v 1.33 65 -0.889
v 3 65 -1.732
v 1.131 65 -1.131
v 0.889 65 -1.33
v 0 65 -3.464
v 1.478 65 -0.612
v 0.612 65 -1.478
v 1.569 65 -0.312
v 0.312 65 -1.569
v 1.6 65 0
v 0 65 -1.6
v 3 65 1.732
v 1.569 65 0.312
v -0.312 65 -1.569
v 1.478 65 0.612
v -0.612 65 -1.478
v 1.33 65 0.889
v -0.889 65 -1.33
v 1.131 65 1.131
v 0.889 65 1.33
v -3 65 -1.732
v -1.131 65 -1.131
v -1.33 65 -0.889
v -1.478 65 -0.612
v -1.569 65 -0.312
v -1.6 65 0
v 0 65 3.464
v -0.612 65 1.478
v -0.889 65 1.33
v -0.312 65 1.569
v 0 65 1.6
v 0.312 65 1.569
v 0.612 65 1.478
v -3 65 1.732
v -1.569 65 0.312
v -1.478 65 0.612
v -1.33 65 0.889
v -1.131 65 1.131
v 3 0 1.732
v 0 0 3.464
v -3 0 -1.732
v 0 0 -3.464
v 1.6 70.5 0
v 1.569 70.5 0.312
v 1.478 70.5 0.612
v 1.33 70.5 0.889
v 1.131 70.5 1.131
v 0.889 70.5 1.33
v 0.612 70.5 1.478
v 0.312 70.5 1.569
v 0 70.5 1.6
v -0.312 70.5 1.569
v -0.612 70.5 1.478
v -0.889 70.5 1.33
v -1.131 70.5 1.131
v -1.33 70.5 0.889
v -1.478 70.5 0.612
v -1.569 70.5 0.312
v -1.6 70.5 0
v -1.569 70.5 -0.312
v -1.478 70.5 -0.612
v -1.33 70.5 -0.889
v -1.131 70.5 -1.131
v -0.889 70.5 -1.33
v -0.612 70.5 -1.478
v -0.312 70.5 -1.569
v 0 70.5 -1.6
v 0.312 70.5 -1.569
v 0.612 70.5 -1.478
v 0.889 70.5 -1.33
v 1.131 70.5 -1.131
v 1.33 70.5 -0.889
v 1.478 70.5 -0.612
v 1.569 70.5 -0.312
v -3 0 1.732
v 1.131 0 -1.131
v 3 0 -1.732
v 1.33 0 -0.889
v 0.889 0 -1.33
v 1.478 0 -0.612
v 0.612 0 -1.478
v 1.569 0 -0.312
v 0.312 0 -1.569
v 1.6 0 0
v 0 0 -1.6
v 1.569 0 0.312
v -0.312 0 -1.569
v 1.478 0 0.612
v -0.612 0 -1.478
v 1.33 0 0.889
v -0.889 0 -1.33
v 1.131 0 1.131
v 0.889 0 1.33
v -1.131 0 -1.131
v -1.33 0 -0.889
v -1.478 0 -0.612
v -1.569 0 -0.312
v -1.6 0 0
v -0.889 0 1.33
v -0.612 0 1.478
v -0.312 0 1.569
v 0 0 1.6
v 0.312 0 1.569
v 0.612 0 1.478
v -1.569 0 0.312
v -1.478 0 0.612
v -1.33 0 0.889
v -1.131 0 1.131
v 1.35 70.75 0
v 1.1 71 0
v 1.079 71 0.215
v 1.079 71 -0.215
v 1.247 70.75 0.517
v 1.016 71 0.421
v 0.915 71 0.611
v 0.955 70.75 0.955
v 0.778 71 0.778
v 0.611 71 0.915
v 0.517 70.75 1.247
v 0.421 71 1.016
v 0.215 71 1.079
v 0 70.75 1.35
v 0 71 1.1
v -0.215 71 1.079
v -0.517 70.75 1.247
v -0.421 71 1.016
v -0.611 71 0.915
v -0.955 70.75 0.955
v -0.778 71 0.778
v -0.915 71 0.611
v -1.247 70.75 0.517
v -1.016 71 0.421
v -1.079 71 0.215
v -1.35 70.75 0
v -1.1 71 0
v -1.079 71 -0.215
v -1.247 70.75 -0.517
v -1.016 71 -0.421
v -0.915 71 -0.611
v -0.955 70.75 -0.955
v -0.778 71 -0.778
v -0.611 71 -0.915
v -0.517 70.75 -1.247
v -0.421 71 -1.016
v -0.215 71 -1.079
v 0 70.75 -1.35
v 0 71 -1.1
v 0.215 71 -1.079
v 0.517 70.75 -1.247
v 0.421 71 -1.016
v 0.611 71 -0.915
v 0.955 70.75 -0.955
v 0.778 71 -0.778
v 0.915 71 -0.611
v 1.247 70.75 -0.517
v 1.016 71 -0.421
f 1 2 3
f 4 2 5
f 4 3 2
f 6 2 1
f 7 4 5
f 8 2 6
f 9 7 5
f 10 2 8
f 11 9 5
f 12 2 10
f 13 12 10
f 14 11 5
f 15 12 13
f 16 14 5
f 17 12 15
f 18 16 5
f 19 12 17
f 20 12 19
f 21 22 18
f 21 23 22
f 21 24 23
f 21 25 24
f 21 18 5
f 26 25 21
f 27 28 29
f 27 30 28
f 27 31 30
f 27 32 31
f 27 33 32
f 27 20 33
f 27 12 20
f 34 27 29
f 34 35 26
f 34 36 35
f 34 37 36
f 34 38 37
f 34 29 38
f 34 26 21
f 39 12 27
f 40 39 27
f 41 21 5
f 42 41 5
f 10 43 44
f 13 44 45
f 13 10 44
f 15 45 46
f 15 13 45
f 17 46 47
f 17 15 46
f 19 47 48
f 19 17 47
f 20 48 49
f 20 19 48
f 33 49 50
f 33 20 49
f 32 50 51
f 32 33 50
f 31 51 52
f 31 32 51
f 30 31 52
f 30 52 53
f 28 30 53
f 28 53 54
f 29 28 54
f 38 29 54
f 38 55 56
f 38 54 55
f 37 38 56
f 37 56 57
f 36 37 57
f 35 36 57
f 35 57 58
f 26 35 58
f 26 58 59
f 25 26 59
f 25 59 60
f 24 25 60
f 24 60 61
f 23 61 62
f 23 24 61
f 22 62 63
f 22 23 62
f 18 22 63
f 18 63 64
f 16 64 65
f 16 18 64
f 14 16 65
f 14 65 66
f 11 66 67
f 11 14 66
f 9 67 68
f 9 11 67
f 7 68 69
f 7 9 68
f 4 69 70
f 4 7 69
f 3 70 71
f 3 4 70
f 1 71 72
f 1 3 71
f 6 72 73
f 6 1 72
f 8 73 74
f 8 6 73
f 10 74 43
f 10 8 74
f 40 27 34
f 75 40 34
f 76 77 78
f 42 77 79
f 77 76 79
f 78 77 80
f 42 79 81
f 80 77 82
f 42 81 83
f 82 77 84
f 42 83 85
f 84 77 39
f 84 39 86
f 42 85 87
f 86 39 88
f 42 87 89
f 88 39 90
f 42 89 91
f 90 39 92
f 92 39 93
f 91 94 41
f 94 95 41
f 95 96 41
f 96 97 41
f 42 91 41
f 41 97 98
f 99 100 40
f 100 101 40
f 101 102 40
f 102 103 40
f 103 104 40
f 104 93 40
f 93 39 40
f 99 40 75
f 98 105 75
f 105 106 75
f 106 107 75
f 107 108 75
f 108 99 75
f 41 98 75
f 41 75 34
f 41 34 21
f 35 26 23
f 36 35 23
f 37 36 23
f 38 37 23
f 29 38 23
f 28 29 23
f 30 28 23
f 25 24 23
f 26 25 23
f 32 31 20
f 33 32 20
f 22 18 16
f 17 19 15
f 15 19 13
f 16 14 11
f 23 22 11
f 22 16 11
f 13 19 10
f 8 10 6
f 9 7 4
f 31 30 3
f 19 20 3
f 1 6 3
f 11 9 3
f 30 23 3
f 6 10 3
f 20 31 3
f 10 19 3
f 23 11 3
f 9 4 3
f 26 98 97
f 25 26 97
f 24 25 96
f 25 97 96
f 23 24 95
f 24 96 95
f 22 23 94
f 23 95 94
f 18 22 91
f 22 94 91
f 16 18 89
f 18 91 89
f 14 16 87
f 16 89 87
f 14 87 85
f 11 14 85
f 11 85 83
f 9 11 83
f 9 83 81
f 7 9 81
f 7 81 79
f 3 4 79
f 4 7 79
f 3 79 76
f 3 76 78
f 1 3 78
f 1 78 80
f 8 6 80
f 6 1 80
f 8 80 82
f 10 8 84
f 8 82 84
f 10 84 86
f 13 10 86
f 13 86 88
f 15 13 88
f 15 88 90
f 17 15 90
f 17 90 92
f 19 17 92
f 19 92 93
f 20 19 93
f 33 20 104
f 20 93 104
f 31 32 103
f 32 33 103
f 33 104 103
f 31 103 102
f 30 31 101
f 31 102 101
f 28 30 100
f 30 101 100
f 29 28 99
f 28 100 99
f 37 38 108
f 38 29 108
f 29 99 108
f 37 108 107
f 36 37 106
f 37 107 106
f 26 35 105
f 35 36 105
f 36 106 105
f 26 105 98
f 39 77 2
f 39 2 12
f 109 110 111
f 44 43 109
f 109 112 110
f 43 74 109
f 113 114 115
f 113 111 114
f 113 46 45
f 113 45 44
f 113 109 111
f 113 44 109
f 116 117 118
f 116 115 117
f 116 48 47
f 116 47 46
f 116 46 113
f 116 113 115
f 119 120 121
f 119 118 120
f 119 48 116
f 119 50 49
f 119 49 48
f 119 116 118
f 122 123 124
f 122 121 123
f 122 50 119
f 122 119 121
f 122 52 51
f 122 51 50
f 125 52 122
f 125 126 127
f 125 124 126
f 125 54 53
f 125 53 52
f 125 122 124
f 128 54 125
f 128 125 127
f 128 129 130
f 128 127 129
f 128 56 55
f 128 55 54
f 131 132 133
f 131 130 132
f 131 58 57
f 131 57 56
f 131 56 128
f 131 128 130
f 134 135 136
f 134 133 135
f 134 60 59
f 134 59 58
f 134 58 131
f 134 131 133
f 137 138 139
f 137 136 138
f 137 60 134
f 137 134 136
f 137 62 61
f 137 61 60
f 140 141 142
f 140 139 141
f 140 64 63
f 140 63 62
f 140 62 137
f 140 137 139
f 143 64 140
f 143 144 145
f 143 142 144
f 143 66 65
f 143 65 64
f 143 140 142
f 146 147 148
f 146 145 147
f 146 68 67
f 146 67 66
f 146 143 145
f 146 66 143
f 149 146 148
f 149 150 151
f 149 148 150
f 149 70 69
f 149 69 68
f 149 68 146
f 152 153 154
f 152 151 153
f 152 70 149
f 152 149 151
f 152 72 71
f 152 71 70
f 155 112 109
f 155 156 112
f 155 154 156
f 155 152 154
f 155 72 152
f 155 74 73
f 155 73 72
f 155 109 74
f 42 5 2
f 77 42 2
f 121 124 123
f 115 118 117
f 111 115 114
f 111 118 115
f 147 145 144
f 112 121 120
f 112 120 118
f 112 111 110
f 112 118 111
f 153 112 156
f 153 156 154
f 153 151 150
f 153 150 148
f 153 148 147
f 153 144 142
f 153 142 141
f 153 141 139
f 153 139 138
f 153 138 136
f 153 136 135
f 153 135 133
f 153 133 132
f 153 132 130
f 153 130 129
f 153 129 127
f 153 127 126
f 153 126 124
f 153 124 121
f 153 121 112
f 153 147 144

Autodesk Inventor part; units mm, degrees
ref_plane "YZ Plane" through (0, 0, 0) normal (1, 0, 0) x (0, 1, 0)
ref_plane "XZ Plane" through (0, 0, 0) normal (0, 1, 0) x (-1, 0, 0)
ref_plane "XY Plane" through (0, 0, 0) normal (0, 0, 1) x (1, 0, 0)
sketch "Sketch1" plane through (0, 0, 0) normal (0, 1, 0) x (-1, 0, 0)
  circle A0 centre (0, 0) radius 1.6
  line L0 (0, -3.4641) -> (-3, -1.7321)
  line L1 (-3, -1.7321) -> (-3, 1.7321)
  line L2 (-3, 1.7321) -> (0, 3.4641)
  line L3 (0, 3.4641) -> (3, 1.7321)
  line L4 (3, 1.7321) -> (3, -1.7321)
  line L5 (3, -1.7321) -> (0, -3.4641)
  dimension "d0" = 3.2
  dimension "d1" = 6
extrude "Extrusion1" add sketch "Sketch1" along normal blind 65
sketch "Sketch2" plane through (0, 65, 0) normal (0, 1, 0) x (1, 0, 0)
  circle A0 centre (0, 0) radius 1.6 projected
  line L0 (3, 1.7321) -> (0, 3.4641) projected
  line L1 (0, 3.4641) -> (-3, 1.7321) projected
  line L2 (-3, 1.7321) -> (-3, -1.7321) projected
  line L3 (-3, -1.7321) -> (0, -3.4641) projected
  line L4 (0, -3.4641) -> (3, -1.7321) projected
  line L5 (3, -1.7321) -> (3, 1.7321) projected
extrude "Extrusion2" add sketch "Sketch2" along normal blind 6 contours A0
chamfer "Chamfer1" distance 0.5 angle 45 1 edges at (-1.6, 71, 0)
thread "Thread1" size "M3.5x0.6" class "6g" standard "ANSI Metric M Profile" full length
properties part number "Standoff 40" material "Nylon 6/6"
